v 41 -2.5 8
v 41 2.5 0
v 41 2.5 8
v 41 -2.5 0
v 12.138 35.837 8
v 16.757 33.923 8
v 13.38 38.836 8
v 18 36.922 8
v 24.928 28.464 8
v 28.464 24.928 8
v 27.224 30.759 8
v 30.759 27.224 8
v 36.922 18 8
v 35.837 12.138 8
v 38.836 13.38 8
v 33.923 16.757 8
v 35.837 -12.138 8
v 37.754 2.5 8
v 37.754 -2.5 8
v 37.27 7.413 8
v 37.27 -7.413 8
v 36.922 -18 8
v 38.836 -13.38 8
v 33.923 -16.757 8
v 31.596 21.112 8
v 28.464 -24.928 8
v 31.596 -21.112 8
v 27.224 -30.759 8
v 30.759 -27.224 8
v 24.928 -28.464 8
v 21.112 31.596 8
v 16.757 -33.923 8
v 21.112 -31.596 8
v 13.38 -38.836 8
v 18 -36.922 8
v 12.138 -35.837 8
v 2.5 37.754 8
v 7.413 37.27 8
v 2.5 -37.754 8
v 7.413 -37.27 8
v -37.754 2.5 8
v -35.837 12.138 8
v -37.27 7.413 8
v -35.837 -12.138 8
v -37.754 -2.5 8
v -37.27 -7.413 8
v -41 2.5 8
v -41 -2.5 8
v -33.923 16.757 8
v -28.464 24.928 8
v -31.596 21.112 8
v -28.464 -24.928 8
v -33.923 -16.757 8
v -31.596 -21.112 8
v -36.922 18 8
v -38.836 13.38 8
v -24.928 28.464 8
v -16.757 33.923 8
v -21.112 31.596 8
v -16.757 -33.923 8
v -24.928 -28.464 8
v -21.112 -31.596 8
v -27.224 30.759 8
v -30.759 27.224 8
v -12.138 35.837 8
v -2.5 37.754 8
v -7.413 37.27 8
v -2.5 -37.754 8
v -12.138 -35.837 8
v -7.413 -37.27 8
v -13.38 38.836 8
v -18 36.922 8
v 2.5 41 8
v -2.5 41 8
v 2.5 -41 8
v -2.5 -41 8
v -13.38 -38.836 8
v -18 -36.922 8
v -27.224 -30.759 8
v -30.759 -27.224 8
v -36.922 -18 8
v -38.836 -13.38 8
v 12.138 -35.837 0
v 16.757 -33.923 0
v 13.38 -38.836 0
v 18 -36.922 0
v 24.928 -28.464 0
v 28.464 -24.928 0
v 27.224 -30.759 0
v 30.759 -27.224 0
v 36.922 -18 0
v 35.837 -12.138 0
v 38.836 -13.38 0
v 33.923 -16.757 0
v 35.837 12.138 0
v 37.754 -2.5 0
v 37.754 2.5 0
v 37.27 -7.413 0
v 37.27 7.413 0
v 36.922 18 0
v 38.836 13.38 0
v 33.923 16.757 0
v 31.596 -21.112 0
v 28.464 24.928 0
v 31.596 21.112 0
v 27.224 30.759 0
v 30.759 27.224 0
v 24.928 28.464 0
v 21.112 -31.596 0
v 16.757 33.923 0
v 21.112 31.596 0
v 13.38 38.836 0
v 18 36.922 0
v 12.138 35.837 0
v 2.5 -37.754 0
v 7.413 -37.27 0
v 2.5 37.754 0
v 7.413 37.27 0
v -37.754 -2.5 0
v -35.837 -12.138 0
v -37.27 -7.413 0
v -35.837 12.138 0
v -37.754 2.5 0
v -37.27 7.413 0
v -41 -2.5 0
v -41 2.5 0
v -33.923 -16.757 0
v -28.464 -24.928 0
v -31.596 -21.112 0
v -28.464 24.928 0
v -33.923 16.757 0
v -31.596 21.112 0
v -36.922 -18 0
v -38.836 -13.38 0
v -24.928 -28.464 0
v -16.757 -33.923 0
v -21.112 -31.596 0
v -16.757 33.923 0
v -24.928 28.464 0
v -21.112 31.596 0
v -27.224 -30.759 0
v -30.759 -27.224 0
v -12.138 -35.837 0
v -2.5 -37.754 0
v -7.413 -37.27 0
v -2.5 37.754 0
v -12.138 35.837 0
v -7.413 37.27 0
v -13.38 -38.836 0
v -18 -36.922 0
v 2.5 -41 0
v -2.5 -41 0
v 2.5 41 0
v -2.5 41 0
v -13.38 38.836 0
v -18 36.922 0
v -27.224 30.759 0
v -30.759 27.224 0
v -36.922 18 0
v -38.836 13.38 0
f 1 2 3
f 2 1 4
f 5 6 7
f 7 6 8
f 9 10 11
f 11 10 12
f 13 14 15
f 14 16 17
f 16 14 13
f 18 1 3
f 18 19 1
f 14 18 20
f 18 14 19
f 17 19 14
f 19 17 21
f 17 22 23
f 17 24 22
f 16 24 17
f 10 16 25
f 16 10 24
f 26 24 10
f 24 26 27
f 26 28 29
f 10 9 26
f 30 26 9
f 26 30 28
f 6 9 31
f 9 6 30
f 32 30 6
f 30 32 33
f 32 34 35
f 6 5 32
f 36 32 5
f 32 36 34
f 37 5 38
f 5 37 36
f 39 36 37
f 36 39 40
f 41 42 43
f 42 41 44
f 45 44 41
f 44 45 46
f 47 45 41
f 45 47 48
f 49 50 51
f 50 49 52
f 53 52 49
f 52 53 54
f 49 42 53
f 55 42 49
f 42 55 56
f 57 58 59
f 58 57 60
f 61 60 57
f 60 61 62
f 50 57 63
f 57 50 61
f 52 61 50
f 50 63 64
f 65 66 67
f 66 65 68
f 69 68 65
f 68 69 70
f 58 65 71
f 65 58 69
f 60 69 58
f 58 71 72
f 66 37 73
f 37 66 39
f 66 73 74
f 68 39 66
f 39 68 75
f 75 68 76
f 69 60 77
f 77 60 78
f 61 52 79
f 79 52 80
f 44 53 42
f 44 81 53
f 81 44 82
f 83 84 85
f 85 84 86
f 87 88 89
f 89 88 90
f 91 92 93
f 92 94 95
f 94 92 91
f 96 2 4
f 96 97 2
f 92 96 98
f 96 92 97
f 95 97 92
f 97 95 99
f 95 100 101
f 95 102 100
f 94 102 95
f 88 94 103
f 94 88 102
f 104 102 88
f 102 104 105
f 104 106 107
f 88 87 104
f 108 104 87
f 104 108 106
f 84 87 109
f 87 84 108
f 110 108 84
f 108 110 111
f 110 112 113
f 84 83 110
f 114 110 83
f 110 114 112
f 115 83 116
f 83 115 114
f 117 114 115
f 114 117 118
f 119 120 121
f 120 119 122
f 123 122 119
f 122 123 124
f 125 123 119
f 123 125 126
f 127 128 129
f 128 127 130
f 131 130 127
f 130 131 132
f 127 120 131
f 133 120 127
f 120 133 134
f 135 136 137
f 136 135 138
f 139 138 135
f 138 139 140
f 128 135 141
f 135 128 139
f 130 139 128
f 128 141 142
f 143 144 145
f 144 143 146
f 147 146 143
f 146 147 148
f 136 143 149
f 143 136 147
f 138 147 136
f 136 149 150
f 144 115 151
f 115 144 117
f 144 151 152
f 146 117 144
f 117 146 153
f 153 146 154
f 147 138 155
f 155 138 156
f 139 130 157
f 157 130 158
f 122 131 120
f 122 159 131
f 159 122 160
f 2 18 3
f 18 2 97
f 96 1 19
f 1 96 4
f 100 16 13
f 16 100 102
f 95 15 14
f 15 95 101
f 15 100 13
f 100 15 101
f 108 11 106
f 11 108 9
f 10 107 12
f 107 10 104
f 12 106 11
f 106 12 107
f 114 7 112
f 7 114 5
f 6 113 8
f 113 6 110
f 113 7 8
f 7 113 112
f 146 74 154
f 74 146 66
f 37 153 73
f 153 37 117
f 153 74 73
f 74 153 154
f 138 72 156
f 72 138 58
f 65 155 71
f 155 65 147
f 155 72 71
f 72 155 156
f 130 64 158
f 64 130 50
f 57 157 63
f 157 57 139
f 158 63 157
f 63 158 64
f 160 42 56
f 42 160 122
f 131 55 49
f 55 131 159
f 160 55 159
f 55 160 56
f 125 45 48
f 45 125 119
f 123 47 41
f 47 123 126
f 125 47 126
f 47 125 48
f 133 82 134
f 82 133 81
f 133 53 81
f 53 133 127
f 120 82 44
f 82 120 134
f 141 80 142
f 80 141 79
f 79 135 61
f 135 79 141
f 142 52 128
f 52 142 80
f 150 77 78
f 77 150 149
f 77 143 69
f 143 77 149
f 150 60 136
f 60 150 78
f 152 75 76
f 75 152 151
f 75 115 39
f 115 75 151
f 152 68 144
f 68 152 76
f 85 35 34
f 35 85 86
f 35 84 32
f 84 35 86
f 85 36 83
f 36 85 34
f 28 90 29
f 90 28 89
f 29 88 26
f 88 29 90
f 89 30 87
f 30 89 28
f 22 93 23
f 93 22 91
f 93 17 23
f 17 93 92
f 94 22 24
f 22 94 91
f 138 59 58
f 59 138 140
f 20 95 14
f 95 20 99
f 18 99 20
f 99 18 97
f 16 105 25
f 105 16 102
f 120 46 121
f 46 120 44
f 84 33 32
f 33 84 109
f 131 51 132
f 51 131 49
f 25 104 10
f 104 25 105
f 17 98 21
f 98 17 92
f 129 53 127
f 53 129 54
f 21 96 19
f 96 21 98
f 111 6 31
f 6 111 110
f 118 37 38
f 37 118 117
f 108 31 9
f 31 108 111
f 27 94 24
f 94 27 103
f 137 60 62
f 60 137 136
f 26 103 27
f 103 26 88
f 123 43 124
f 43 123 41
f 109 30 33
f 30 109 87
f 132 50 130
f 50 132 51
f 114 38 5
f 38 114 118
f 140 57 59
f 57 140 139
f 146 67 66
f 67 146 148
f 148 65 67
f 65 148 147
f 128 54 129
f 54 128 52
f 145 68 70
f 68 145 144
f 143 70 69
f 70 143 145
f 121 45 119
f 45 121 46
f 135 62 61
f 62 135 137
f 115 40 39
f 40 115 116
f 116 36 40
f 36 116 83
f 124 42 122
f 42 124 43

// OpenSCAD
$fn = 32;

// ----------------------------------------------------------------------
// Spur blank: plain gear blank
// ----------------------------------------------------------------------

// --- parameters (mm) ---
disc_r = 38;              // blank root radius
disc_t = 8;               // blank thickness
n_teeth = 16;             // stub tooth count
tooth_w = 5;              // tooth width at the root
tooth_h = 3;              // tooth height above the root

out_r = disc_r + tooth_h;  // tip radius
bbox_x = 82.0;  // measured width over the teeth
bbox_y = 82.0;  // measured depth over the teeth

union() {
  cylinder(r = disc_r, h = disc_t);
  for (i = [0 : n_teeth - 1])
    rotate([0, 0, i * 360 / n_teeth])
      translate([disc_r - 1, -tooth_w / 2, 0])
        cube([tooth_h + 1, tooth_w, disc_t]);
}
